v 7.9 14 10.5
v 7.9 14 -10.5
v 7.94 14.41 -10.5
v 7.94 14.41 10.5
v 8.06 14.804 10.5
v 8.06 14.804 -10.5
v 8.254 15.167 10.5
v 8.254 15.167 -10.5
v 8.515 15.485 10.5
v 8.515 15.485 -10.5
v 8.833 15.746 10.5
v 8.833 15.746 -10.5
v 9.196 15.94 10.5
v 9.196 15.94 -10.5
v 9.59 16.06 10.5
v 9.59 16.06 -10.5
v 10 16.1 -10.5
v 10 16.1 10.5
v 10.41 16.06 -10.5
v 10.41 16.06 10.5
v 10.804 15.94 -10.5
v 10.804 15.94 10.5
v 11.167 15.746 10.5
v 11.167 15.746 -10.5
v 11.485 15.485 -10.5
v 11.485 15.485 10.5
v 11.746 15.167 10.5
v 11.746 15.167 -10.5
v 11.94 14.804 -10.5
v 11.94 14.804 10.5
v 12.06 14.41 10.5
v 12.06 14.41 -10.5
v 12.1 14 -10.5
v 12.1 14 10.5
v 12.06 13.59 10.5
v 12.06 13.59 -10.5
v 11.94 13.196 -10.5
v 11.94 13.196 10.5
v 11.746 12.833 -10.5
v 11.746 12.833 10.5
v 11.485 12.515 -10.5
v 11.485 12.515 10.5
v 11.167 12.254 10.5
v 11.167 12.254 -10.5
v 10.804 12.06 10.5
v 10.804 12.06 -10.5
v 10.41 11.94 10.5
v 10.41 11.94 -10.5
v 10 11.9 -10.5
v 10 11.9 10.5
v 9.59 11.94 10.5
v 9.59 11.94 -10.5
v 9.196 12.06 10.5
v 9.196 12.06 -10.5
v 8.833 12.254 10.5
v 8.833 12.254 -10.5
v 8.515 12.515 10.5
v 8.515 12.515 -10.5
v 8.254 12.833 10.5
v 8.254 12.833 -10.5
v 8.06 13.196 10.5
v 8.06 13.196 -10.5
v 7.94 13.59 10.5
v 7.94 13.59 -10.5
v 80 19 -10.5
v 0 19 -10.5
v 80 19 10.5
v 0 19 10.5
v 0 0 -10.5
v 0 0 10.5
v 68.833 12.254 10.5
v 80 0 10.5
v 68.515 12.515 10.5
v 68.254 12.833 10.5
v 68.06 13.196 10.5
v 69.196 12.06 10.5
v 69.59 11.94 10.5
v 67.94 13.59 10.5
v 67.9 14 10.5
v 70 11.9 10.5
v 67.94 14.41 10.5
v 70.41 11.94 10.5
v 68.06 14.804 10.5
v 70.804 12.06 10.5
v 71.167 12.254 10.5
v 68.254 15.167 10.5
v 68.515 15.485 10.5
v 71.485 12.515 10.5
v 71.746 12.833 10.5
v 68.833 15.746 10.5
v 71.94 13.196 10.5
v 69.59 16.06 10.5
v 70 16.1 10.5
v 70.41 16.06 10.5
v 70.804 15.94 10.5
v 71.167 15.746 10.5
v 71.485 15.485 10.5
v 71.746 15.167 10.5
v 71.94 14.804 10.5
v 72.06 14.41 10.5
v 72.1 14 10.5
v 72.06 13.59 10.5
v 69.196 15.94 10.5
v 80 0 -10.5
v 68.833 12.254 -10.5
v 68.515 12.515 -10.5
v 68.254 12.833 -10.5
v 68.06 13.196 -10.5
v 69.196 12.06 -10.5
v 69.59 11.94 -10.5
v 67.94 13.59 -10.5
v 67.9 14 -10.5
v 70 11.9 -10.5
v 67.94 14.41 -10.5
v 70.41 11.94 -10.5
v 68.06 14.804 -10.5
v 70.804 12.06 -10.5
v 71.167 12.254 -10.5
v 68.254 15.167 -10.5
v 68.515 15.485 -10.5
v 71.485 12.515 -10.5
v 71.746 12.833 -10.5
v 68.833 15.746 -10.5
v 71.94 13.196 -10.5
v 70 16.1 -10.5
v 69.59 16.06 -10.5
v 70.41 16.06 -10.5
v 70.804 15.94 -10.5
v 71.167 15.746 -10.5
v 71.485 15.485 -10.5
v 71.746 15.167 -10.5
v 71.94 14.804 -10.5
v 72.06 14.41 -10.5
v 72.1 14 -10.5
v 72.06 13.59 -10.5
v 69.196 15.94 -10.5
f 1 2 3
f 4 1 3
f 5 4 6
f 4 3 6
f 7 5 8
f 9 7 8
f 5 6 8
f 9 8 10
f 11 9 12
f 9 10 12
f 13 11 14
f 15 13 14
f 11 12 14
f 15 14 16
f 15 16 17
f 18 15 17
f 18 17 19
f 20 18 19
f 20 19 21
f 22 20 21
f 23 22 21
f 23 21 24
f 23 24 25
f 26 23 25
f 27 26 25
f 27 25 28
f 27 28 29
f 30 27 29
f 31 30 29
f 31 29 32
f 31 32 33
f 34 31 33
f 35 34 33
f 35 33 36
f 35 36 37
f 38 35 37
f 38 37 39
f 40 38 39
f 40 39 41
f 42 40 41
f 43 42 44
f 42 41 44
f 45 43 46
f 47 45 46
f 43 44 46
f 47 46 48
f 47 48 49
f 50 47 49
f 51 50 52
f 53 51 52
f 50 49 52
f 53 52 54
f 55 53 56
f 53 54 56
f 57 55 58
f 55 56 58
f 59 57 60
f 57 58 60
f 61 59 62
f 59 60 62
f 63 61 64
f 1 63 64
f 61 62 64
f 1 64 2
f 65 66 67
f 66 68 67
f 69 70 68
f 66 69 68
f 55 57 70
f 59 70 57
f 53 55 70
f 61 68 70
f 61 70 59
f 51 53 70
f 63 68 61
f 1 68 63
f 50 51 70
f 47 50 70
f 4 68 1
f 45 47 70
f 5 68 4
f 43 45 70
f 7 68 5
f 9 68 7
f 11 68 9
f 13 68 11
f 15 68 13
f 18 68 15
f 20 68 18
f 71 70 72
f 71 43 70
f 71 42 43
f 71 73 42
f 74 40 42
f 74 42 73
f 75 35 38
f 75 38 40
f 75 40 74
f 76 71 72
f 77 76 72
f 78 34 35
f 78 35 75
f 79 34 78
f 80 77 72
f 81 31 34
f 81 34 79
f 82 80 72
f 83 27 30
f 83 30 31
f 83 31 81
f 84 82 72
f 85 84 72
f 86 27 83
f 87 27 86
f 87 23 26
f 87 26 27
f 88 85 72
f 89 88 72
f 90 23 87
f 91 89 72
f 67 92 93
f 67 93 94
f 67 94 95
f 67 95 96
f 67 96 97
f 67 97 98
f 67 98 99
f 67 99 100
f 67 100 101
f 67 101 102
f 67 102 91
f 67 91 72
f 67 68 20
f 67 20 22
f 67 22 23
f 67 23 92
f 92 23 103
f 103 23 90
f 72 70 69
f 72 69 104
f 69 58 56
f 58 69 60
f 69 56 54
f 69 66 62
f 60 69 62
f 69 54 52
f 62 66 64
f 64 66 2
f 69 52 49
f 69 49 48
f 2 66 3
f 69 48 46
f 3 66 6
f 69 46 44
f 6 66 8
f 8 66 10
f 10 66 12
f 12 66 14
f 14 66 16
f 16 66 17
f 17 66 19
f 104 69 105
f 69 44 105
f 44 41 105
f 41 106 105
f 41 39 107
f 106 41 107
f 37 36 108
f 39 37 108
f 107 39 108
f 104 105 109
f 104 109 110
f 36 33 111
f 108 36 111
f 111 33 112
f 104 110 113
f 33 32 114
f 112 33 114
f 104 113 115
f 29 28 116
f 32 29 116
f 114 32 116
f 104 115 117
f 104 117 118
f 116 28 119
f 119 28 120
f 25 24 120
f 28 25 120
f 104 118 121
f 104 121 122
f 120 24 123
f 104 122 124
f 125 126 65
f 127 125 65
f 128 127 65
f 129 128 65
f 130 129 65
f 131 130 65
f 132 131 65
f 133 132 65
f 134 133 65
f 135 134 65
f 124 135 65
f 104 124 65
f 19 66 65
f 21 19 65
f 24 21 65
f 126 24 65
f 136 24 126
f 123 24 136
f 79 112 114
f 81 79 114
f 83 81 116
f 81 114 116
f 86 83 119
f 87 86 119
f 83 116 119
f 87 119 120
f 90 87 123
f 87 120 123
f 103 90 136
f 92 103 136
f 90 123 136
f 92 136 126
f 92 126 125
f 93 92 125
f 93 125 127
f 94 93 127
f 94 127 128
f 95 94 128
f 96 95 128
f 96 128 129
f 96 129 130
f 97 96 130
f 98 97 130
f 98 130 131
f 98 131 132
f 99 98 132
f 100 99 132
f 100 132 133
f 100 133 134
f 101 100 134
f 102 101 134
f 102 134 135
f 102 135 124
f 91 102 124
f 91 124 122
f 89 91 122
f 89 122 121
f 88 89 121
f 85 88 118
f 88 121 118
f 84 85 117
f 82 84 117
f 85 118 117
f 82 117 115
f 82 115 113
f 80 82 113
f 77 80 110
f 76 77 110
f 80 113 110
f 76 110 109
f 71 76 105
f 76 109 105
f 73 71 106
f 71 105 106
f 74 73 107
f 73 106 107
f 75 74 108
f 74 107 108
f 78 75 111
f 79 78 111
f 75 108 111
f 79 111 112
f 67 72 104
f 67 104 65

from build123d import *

# Parameters (mm, degrees)
SKETCH1_W             = 80
SKETCH1_H             = 19
BOSS_EXTRUDE1_DEPTH   = 10.5
M5X0_8_TAPPED_HOLE1_D = 4.2


with BuildPart() as part:
    # Sketch1 → Boss-Extrude1 (new, symmetric)
    with BuildSketch(Plane.XY):
        with Locations((40, 9.5)):
            Rectangle(SKETCH1_W, SKETCH1_H)
    extrude(amount=BOSS_EXTRUDE1_DEPTH, both=True)

    # M5x0.8 Tapped Hole1 (through all)
    with Locations(Plane.XY.offset(10.5)):
        with Locations((10, 14), (70, 14)):
            Hole(M5X0_8_TAPPED_HOLE1_D / 2)


solid = part.part
